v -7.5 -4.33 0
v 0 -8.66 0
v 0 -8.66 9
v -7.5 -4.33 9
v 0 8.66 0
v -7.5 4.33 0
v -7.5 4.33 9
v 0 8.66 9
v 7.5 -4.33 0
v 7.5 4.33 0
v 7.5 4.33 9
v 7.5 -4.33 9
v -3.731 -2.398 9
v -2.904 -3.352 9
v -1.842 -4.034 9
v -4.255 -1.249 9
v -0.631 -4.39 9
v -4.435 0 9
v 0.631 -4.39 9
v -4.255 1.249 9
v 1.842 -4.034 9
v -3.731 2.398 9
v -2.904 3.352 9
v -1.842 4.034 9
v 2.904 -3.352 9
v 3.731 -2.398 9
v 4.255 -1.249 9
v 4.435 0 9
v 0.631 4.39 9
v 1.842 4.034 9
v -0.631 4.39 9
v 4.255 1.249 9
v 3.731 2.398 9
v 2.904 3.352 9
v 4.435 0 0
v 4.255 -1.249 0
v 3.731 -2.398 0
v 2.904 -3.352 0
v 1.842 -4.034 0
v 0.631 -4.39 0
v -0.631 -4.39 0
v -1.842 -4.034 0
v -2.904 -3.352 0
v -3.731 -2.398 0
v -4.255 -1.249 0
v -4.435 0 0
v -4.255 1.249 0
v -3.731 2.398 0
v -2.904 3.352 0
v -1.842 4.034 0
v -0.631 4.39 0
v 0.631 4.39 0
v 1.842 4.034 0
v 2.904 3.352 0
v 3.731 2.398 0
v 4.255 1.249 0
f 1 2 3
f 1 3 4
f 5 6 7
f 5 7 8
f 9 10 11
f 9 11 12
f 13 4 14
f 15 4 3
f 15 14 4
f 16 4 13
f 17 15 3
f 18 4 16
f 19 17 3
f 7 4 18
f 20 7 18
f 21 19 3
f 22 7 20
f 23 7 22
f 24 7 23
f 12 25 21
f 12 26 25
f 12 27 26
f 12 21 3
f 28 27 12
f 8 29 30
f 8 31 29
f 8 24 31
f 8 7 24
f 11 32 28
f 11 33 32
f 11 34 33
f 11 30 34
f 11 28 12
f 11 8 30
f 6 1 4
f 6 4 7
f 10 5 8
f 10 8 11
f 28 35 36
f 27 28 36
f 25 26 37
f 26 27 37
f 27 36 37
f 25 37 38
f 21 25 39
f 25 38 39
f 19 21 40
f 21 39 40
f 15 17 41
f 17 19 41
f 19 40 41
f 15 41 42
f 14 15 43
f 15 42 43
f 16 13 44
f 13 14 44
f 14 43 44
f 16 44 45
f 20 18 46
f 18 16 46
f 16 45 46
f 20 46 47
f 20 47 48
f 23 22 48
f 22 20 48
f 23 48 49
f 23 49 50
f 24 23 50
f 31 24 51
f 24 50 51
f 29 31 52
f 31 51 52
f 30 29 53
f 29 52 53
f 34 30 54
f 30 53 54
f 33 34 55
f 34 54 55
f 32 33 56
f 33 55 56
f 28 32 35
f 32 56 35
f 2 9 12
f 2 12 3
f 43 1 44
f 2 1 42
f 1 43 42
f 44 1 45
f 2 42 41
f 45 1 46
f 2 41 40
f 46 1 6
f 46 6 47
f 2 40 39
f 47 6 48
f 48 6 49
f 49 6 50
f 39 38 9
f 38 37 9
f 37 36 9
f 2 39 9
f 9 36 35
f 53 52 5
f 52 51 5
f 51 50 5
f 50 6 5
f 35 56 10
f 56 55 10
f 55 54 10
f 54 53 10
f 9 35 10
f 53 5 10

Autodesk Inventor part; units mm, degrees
ref_plane "YZ Plane" through (0, 0, 0) normal (1, 0, 0) x (0, 1, 0)
ref_plane "XZ Plane" through (0, 0, 0) normal (0, 1, 0) x (-1, 0, 0)
ref_plane "XY Plane" through (0, 0, 0) normal (0, 0, 1) x (1, 0, 0)
sketch "Sketch1" plane through (0, 0, 0) normal (0, 0, 1) x (1, 0, 0)
  circle A0 centre (0, 0) radius 4.435
  line L0 (0, 8.6603) -> (7.5, 4.3301)
  line L1 (7.5, 4.3301) -> (7.5, -4.3301)
  line L2 (7.5, -4.3301) -> (0, -8.6603)
  line L3 (0, -8.6603) -> (-7.5, -4.3301)
  line L4 (-7.5, -4.3301) -> (-7.5, 4.3301)
  line L5 (-7.5, 4.3301) -> (0, 8.6603)
  dimension "d0" = 8.87
  dimension "d3" = 15
extrude "Extrusion1" add sketch "Sketch1" along normal blind 9
thread "Thread1" size "M9x1.25" class "6H" standard "ANSI Metric M Profile" full length
properties part number "EEThreadedRodNut"
